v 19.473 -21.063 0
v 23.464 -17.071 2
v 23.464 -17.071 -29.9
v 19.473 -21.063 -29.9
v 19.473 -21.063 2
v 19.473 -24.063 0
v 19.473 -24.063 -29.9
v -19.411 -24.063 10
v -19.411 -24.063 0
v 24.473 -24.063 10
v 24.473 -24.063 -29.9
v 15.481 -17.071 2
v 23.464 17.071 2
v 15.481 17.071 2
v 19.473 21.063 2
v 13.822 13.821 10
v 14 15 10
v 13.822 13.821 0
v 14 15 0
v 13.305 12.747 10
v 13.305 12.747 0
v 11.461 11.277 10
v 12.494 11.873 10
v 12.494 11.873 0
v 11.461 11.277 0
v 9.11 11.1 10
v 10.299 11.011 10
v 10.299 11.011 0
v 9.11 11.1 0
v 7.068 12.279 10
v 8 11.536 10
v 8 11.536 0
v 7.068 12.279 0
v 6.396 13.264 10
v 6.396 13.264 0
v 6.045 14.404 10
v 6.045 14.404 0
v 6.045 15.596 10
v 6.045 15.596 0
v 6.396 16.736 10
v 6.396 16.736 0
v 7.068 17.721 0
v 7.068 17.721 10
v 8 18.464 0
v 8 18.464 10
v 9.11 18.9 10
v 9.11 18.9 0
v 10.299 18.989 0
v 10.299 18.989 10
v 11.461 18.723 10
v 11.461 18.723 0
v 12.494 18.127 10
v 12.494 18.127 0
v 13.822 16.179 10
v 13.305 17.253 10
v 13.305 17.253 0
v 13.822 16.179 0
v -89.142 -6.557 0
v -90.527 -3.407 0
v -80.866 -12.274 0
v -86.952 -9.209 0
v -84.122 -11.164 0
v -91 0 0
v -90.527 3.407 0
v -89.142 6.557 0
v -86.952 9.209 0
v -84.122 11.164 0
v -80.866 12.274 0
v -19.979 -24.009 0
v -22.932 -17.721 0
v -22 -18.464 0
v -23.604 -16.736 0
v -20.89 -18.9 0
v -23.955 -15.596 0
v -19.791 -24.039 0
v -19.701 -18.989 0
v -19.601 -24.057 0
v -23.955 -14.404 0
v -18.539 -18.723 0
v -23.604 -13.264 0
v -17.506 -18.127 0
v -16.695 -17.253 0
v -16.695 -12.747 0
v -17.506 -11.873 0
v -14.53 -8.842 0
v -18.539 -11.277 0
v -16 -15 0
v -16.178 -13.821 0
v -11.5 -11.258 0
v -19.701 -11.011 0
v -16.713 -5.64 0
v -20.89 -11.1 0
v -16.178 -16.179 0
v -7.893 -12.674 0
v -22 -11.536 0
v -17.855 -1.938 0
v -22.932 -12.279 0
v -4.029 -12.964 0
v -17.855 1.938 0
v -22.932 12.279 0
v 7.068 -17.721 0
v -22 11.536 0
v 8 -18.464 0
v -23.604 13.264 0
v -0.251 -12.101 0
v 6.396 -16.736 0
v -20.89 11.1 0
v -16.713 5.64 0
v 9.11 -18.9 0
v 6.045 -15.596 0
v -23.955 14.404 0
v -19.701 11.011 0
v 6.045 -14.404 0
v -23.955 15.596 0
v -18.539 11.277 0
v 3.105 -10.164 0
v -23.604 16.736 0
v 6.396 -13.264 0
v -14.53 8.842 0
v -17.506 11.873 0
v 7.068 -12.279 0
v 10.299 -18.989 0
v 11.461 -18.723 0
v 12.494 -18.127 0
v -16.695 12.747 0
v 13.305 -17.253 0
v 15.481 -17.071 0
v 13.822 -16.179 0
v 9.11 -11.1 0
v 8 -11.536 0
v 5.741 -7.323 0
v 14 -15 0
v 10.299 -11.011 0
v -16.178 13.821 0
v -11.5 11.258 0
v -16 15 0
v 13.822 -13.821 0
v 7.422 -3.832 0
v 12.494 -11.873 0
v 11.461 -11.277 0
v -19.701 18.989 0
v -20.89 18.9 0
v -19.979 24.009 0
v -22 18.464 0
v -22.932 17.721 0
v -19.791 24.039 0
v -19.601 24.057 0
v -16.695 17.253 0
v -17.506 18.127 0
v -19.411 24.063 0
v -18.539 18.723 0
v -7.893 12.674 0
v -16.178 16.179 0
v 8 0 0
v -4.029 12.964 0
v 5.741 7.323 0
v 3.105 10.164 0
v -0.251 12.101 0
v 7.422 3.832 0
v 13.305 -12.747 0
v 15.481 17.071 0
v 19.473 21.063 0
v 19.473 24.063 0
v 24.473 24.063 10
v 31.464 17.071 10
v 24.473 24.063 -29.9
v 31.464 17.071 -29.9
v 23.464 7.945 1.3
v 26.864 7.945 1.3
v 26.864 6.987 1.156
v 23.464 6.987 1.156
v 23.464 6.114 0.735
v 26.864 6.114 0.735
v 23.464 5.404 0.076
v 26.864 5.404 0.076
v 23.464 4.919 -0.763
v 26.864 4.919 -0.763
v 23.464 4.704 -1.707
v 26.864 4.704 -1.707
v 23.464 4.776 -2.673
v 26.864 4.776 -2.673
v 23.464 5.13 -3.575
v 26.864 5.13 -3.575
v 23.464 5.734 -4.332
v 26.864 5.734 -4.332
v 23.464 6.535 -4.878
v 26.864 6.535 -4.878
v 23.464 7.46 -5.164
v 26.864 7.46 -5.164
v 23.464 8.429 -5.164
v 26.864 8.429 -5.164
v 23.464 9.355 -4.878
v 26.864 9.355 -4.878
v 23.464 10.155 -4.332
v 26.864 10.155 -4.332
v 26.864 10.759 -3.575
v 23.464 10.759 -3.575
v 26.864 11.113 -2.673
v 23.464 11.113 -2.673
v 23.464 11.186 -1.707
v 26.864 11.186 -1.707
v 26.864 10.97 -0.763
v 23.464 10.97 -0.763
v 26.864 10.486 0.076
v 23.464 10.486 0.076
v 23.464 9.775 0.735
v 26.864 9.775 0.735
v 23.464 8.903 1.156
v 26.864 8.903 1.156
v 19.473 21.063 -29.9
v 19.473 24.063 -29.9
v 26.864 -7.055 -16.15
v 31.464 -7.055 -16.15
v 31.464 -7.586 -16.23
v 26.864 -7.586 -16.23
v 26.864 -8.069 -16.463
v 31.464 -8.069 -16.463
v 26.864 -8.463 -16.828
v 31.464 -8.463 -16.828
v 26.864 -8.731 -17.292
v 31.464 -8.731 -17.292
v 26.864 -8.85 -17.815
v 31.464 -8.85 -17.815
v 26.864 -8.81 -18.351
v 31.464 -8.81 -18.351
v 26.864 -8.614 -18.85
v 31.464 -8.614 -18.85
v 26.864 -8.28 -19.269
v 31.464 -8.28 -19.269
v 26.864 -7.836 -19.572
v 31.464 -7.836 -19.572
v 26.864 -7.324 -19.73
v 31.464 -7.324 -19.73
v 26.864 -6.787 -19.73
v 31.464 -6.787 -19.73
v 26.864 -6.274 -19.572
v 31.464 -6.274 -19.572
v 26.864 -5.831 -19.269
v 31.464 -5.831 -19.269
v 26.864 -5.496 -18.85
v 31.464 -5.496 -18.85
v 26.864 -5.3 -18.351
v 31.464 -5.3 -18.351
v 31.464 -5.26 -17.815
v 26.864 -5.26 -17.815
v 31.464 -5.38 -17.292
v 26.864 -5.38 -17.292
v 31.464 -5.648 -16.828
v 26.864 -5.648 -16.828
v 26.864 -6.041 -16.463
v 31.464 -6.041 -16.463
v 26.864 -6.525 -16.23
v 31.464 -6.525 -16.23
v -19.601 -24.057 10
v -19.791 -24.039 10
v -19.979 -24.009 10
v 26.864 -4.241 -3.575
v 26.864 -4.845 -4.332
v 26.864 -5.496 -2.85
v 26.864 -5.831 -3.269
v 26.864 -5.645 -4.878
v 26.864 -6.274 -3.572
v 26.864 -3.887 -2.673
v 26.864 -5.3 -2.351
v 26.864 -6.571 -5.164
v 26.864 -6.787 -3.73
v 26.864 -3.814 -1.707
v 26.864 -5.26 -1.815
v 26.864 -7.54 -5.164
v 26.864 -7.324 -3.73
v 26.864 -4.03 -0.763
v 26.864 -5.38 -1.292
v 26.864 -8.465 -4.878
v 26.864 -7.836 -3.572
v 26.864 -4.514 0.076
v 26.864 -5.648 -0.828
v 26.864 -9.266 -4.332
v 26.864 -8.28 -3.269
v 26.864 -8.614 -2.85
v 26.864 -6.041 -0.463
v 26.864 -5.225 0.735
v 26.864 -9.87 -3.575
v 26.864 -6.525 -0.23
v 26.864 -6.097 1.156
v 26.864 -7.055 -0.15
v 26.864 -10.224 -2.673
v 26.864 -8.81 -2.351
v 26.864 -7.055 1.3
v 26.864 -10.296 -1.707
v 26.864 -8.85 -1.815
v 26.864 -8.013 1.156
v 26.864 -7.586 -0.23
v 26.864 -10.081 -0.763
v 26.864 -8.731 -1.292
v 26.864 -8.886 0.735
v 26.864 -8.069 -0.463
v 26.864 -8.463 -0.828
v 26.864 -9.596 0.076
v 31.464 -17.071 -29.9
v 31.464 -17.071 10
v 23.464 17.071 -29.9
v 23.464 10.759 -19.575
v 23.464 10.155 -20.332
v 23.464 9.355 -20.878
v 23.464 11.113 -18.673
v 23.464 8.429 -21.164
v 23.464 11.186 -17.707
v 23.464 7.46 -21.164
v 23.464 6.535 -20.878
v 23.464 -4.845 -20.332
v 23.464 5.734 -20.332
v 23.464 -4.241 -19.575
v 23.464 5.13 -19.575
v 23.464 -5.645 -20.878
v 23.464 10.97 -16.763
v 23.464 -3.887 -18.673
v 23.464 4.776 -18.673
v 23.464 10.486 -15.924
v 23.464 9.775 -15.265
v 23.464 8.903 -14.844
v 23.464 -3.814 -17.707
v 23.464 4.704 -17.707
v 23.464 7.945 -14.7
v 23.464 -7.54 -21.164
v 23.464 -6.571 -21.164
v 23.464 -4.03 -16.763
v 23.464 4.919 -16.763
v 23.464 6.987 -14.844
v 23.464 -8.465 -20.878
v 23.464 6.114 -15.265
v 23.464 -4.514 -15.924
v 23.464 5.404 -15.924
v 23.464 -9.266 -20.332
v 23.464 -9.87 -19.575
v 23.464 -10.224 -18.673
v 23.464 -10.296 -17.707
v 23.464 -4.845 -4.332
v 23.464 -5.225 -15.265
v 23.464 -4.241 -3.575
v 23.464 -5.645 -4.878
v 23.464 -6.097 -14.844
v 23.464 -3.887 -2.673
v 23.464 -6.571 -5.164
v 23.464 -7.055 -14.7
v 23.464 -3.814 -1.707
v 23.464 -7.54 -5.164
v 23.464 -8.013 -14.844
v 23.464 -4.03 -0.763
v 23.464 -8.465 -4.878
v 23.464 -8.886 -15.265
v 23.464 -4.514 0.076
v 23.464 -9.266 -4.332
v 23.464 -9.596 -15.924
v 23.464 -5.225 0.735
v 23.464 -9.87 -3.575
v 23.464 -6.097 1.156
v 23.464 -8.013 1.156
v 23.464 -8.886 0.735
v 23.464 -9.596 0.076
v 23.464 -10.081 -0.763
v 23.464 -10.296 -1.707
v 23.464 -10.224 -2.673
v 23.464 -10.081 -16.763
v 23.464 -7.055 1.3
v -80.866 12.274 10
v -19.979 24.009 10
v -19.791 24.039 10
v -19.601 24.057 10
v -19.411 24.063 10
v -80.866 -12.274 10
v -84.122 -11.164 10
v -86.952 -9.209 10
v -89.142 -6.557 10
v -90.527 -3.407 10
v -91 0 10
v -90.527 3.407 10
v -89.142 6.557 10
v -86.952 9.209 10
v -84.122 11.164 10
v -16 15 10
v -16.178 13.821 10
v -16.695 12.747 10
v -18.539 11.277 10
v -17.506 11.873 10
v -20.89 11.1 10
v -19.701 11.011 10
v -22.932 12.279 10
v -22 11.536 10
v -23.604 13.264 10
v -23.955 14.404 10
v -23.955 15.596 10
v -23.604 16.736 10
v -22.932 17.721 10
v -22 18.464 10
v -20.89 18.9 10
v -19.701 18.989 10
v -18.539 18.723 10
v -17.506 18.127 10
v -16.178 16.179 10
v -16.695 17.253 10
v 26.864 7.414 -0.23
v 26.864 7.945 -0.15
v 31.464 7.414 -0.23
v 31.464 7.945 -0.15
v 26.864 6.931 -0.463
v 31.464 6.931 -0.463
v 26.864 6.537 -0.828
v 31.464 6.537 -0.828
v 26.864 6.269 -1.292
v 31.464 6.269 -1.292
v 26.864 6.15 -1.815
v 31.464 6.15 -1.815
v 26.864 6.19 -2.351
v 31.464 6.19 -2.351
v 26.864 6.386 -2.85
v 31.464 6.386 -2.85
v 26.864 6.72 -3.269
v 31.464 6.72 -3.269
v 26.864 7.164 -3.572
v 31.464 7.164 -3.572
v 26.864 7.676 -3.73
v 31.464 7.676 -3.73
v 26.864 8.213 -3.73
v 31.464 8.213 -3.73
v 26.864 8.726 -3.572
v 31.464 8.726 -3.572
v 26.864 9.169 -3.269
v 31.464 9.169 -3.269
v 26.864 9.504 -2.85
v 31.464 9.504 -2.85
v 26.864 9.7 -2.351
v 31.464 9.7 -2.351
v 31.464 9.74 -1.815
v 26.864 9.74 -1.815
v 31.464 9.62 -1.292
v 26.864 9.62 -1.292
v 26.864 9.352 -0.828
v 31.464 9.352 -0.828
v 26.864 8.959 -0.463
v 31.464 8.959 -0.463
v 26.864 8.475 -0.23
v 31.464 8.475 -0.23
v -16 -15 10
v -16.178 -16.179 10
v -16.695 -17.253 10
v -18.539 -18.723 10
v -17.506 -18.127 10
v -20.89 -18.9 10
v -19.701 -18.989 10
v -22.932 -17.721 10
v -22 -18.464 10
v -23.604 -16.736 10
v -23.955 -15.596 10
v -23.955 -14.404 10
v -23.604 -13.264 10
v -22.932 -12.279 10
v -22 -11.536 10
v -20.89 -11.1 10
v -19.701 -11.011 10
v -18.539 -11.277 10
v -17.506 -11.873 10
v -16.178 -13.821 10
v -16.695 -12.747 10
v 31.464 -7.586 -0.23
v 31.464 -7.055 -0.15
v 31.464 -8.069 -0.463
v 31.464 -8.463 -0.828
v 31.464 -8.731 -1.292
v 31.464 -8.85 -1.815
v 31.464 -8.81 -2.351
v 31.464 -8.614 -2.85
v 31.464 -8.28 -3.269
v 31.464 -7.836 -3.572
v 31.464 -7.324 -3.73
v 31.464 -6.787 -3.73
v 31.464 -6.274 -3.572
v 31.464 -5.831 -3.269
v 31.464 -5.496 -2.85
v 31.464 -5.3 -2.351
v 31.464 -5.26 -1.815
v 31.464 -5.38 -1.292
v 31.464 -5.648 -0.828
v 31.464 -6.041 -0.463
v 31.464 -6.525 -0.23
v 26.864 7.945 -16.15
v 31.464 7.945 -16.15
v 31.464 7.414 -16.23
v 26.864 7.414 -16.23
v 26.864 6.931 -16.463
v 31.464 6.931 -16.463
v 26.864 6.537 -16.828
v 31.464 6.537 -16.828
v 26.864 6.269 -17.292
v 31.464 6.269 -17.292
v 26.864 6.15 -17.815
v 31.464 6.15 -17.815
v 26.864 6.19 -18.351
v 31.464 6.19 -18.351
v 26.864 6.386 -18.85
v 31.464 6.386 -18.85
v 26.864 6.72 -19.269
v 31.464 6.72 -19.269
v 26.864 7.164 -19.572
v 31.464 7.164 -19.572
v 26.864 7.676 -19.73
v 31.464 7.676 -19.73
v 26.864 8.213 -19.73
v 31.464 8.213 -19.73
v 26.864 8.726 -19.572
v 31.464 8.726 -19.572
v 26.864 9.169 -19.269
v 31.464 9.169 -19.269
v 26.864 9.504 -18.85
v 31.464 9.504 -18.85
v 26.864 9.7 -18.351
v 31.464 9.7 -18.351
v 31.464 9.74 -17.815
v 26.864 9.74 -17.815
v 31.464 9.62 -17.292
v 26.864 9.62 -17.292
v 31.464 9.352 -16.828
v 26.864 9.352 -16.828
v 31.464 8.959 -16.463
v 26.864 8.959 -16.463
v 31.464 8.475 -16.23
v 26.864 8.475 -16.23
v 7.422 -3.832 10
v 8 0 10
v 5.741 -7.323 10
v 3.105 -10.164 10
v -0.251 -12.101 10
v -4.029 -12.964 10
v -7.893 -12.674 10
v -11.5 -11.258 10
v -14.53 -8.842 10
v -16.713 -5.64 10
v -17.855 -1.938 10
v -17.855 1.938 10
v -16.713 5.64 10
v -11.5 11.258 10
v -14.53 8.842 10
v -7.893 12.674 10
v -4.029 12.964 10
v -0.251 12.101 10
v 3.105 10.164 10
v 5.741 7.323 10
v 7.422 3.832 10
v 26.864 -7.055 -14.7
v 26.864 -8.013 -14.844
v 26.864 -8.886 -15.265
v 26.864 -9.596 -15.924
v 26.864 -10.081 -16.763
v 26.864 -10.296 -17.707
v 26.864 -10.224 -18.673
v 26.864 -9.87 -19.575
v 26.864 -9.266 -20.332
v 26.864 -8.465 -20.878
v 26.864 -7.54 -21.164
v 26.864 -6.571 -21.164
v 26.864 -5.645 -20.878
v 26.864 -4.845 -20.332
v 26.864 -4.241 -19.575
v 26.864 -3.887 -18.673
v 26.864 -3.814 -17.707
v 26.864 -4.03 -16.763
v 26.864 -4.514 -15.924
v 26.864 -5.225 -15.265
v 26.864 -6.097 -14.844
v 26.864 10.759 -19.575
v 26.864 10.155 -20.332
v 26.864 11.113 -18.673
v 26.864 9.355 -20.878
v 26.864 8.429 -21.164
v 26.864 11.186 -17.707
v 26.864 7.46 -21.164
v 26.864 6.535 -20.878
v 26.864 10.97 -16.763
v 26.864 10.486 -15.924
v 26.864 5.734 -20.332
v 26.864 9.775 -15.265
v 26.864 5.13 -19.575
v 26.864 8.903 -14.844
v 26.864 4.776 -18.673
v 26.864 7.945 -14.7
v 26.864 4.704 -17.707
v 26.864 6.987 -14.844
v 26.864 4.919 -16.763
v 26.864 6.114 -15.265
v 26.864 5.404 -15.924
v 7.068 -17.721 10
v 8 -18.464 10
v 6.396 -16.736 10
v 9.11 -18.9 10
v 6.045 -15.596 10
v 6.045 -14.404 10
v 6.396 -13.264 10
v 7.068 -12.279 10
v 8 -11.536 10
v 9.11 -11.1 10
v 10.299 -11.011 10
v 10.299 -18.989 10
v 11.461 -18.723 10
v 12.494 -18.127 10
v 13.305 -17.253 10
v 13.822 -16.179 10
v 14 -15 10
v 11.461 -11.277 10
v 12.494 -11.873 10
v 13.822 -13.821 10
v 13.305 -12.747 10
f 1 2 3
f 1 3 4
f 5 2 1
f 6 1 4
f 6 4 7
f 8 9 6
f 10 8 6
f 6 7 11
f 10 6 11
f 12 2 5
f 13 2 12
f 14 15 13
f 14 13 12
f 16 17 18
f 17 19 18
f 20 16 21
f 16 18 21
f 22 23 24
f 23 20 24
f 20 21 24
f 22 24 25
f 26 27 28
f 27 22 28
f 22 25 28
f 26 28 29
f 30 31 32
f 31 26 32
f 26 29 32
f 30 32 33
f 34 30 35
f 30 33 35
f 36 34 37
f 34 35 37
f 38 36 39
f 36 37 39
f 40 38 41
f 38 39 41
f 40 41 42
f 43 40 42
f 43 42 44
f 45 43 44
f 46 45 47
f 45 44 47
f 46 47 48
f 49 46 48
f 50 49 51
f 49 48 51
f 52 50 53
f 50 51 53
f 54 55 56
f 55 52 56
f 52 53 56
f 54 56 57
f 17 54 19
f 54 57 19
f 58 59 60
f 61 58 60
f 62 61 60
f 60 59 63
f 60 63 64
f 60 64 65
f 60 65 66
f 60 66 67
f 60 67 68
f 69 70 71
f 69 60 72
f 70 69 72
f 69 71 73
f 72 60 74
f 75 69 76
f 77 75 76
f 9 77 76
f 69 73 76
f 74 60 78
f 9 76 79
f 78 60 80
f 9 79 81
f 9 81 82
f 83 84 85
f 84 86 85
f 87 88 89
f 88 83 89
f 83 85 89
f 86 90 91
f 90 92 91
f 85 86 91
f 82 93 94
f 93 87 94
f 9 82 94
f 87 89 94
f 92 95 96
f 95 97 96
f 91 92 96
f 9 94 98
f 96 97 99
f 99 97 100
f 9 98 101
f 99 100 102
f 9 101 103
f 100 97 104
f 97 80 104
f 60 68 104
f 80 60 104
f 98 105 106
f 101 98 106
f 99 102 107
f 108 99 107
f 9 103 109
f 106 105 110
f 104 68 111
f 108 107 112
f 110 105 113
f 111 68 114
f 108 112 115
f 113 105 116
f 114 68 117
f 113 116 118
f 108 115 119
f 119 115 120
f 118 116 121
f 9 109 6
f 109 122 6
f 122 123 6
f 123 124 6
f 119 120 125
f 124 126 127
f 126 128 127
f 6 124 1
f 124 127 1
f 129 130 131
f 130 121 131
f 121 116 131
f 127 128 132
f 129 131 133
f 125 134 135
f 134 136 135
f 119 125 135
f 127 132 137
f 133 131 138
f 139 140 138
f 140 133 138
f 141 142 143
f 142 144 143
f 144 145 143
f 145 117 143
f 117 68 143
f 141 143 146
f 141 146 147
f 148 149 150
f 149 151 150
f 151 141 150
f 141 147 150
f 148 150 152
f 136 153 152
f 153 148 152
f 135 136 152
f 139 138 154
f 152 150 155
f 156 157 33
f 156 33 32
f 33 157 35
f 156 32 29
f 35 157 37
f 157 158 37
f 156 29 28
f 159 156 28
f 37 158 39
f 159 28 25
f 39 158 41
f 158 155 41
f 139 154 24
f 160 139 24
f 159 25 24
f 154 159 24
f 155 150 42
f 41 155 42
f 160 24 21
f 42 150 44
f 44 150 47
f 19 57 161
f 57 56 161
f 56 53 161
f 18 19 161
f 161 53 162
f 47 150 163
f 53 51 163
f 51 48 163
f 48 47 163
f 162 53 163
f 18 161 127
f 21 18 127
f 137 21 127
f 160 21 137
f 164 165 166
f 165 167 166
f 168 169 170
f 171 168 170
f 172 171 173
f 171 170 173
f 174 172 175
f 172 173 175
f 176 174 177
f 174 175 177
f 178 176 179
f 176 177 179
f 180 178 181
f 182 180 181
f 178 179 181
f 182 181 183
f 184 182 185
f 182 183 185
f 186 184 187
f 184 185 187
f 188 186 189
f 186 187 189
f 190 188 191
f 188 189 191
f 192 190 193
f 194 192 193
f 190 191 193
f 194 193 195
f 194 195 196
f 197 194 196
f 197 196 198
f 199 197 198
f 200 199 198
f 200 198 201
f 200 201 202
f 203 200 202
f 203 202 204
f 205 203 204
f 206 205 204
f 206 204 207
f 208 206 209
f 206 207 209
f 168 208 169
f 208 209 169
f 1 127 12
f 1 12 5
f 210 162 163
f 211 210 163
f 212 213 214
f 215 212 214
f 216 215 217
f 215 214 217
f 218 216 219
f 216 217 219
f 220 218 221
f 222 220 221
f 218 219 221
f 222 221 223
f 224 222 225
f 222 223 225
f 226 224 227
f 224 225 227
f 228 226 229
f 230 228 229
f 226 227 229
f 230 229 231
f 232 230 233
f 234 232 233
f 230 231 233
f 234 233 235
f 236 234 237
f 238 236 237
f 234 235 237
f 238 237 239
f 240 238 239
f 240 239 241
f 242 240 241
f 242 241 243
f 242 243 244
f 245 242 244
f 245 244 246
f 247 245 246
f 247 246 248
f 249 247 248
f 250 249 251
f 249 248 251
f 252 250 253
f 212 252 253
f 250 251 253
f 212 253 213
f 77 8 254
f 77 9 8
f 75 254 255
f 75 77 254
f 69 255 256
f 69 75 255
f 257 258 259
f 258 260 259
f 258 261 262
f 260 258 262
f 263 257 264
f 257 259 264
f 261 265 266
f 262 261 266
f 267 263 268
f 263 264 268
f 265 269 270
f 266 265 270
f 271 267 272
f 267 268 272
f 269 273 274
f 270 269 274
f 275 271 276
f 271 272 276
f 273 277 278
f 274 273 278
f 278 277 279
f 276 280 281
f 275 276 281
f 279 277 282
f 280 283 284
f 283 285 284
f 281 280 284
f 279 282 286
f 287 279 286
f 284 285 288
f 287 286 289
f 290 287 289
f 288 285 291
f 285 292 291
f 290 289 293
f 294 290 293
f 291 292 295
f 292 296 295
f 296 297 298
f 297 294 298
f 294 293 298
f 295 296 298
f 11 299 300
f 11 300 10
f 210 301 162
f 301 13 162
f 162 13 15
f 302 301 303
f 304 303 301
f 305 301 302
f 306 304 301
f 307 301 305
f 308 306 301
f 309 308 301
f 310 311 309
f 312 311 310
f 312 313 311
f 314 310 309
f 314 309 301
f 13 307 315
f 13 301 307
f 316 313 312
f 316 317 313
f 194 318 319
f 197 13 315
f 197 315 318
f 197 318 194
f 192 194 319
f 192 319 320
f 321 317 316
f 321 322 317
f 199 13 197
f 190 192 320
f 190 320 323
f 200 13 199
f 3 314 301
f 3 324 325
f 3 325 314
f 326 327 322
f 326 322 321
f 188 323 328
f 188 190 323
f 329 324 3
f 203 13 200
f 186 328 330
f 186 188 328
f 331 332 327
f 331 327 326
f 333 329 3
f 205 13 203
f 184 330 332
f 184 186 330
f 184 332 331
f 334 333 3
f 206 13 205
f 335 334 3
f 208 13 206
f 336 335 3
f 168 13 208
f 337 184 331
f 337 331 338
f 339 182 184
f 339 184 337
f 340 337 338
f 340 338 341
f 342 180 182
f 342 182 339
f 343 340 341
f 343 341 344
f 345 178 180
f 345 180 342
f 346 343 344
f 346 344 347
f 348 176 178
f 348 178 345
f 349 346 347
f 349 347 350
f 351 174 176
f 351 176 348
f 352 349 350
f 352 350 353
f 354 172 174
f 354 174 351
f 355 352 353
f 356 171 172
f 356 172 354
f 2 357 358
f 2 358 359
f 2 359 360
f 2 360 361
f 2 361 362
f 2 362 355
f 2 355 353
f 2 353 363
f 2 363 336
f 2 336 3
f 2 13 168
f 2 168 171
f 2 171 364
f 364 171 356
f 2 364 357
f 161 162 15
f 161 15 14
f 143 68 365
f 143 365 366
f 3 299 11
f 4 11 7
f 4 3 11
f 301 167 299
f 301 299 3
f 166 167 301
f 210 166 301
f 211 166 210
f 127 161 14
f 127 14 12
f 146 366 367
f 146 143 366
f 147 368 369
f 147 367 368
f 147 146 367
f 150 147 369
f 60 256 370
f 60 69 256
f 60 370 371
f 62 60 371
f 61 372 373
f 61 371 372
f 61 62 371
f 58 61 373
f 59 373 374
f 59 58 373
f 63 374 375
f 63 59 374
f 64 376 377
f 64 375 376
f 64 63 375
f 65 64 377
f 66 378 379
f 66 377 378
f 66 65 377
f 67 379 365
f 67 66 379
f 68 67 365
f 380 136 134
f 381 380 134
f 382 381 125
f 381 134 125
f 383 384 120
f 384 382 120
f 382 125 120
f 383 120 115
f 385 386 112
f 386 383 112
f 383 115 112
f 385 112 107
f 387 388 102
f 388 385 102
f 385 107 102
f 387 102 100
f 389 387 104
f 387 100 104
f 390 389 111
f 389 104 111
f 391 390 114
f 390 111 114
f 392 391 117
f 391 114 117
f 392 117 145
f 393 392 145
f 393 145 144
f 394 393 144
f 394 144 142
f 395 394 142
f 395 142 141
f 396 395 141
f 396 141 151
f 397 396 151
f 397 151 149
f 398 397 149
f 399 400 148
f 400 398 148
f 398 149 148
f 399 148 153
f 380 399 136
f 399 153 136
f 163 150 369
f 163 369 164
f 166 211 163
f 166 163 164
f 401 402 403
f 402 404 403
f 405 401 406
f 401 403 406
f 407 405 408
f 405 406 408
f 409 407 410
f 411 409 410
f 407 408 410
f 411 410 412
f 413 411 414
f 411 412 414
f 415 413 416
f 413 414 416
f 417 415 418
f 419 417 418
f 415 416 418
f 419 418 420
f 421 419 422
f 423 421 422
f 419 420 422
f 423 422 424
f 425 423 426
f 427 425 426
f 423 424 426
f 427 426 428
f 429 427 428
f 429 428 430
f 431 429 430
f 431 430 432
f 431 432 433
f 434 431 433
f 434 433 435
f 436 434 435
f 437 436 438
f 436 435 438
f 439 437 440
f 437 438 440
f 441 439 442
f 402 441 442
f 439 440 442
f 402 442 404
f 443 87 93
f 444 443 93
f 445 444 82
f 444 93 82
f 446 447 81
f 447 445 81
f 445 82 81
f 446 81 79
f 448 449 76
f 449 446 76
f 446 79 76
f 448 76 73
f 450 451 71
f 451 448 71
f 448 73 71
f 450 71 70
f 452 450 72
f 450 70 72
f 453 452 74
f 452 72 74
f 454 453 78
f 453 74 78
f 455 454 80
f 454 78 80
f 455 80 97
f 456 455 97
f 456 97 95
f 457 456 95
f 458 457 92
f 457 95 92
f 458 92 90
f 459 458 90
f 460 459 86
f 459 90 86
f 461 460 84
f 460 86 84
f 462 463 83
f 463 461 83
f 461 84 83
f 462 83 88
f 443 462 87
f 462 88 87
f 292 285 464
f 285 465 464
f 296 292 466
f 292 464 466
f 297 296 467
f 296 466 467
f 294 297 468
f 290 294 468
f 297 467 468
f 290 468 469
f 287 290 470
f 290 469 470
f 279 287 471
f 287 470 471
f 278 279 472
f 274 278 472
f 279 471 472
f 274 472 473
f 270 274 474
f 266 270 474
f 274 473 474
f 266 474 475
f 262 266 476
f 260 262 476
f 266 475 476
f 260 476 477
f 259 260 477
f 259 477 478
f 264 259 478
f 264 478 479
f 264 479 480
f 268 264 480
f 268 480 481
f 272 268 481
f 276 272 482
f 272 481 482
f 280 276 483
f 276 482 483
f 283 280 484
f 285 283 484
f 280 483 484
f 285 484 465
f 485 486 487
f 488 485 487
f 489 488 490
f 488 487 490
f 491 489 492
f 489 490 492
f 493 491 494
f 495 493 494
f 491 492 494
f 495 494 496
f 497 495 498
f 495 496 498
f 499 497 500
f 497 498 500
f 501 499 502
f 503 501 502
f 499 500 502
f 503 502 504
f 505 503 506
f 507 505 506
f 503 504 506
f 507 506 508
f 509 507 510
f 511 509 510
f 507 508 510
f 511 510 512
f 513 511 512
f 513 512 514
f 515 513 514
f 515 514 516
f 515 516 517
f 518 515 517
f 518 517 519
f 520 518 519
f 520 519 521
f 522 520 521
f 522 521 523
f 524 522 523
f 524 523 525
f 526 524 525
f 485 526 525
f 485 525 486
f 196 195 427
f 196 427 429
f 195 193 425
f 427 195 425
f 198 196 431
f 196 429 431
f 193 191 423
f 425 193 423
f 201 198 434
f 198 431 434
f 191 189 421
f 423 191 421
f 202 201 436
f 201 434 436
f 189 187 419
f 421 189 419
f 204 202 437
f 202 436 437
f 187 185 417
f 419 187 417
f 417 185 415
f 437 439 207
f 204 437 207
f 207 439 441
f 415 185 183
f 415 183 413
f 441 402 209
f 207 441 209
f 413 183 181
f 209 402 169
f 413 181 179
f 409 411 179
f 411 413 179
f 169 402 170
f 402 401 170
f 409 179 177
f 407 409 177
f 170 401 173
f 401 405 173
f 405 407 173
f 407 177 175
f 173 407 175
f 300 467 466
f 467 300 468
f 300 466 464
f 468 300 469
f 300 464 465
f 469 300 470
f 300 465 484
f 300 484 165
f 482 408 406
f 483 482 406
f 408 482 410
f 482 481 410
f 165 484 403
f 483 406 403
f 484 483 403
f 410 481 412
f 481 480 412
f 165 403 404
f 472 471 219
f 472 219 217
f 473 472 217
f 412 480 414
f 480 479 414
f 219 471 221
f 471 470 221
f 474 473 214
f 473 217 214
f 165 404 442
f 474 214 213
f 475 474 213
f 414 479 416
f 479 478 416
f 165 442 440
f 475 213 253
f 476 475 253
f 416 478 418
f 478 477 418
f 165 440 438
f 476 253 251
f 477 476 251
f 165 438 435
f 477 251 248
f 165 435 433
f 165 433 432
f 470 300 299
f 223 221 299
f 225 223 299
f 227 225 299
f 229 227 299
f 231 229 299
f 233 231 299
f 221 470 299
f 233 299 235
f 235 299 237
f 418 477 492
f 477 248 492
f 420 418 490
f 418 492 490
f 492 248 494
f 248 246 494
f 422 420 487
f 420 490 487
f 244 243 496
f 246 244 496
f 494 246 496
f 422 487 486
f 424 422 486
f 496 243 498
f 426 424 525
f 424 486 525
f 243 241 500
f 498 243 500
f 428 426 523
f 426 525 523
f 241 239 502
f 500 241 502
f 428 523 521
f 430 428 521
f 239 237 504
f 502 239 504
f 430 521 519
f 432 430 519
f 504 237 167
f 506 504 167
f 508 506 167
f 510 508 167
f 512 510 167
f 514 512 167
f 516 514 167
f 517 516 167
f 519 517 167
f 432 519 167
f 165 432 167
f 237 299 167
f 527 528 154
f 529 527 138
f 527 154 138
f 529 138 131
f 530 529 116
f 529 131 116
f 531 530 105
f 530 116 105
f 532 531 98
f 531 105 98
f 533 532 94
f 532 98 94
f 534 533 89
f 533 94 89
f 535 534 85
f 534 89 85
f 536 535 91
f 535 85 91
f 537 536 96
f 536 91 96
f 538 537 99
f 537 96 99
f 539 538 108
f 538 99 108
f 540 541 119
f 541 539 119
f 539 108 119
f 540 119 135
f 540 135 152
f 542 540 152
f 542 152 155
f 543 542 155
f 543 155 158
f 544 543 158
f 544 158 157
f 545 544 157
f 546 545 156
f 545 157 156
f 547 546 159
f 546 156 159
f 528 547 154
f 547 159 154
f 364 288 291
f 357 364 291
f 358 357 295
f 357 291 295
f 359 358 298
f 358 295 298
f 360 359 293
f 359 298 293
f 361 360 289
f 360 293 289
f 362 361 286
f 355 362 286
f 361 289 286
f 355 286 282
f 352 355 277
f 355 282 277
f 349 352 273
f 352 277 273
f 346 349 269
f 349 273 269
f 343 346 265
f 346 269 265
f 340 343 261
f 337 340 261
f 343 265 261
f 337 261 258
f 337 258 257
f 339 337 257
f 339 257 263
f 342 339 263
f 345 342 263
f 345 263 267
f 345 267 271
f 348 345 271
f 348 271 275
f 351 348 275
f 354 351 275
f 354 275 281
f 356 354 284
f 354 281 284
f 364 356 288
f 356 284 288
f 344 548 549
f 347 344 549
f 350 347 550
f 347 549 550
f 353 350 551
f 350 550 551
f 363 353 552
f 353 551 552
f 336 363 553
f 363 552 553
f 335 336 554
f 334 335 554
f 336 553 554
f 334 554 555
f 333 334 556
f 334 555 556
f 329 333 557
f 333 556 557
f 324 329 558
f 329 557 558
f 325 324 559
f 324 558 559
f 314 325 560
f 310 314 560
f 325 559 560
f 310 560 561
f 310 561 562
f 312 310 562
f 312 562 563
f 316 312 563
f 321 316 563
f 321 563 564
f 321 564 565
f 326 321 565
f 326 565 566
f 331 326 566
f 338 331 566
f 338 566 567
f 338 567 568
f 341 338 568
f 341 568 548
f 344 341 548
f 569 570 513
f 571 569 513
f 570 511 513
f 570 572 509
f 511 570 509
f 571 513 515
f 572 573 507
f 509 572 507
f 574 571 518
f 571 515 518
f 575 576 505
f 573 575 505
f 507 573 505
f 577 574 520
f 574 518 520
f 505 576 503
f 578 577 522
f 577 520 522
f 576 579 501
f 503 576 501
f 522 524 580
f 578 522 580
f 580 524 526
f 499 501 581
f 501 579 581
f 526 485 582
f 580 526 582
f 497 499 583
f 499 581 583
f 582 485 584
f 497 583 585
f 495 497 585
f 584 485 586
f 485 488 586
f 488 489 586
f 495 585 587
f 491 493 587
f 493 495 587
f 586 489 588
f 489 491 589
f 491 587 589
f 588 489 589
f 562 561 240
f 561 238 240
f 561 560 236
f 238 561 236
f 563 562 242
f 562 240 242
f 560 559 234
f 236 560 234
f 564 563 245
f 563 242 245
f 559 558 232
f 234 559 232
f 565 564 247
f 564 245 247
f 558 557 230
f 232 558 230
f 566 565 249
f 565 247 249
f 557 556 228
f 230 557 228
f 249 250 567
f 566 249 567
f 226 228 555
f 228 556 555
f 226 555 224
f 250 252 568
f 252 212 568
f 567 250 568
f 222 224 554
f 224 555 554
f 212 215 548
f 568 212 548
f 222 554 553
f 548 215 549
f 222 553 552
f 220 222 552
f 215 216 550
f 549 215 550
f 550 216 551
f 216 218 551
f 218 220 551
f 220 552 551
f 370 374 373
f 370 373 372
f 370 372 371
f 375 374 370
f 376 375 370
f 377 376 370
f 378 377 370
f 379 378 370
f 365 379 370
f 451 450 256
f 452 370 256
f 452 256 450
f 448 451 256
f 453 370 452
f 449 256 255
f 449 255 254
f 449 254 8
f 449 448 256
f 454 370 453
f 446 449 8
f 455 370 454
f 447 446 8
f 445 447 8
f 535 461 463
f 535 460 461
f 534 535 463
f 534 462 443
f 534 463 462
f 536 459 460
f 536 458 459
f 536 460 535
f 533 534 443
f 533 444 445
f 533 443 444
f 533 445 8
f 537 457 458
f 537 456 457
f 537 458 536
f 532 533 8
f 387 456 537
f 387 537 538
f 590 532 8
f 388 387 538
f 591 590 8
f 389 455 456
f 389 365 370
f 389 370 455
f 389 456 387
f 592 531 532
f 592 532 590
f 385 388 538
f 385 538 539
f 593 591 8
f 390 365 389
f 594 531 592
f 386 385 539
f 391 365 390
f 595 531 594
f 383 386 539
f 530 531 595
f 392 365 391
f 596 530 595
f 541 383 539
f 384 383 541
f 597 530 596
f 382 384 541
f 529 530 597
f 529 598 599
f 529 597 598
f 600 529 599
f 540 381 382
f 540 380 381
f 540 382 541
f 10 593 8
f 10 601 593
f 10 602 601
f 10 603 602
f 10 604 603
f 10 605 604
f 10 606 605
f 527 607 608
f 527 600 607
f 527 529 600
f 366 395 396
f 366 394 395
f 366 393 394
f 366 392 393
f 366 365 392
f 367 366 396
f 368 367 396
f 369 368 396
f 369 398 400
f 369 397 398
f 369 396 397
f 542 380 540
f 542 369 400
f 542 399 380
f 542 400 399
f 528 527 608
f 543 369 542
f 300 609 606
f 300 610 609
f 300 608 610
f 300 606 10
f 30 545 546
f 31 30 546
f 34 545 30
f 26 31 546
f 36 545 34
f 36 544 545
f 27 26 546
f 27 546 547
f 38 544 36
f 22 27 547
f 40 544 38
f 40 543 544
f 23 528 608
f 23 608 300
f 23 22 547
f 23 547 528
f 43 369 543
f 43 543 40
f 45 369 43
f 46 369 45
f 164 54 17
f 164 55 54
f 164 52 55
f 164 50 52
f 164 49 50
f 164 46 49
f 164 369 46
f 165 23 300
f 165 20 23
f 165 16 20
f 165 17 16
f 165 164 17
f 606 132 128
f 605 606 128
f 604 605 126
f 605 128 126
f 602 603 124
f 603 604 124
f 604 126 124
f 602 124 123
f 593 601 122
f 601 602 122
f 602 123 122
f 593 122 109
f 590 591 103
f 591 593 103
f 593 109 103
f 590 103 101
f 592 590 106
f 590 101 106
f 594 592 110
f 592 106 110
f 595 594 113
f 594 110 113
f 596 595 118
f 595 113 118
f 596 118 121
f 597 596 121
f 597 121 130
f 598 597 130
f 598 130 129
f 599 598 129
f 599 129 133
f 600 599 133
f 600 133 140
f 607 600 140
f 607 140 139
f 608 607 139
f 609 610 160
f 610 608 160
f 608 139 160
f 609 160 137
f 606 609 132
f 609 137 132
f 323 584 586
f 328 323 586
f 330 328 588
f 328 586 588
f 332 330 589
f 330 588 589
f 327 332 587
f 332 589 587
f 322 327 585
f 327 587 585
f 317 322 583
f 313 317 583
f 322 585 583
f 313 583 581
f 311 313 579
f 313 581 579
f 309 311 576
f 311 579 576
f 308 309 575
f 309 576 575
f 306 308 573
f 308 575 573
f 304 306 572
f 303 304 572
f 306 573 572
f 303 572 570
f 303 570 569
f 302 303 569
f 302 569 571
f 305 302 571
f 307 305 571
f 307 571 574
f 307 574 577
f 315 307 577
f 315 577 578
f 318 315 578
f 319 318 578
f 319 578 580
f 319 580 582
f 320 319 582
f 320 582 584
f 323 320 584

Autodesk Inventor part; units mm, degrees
ref_plane "YZ Plane" through (0, 0, 0) normal (1, 0, 0) x (0, 1, 0)
ref_plane "XZ Plane" through (0, 0, 0) normal (0, 1, 0) x (-1, 0, 0)
ref_plane "XY Plane" through (0, 0, 0) normal (0, 0, 1) x (1, 0, 0)
sketch "Sketch1" plane through (0, 0, 0) normal (0, 0, 1) x (1, 0, 0)
  arc A0 (18.1843, -16.5324) -> (18.7618, -13.101) centre (16.0629, -14.4111) ccw projected
  arc A1 (18.7618, 13.101) -> (18.7618, -13.101) centre (45.75, 0) ccw projected
  arc A2 (18.7618, 13.101) -> (18.1843, 16.5324) centre (16.0629, 14.4111) ccw projected
  line L0 (11.5324, 23.1843) -> (18.1843, 16.5324) projected
  arc A3 (11.5324, 23.1843) -> (8.101, 23.7618) centre (9.4111, 21.0629) ccw projected
  arc A4 (-18.101, 23.7618) -> (8.101, 23.7618) centre (-5, 50.75) ccw projected
  arc A5 (-18.101, 23.7618) -> (-21.5324, 23.1843) centre (-19.4111, 21.0629) ccw projected
  line L1 (-28.1843, 16.5324) -> (-21.5324, 23.1843) projected
  arc A6 (-28.1843, 16.5324) -> (-28.7618, 13.101) centre (-26.0629, 14.4111) ccw projected
  arc A7 (-28.7618, -13.101) -> (-28.7618, 13.101) centre (-55.75, 0) ccw projected
  arc A8 (-28.7618, -13.101) -> (-28.1843, -16.5324) centre (-26.0629, -14.4111) ccw projected
  line L2 (-21.5324, -23.1843) -> (-28.1843, -16.5324) projected
  arc A9 (-21.5324, -23.1843) -> (-18.101, -23.7618) centre (-19.4111, -21.0629) ccw projected
  arc A10 (8.101, -23.7618) -> (-18.101, -23.7618) centre (-5, -50.75) ccw projected
  arc A11 (8.101, -23.7618) -> (11.5324, -23.1843) centre (9.4111, -21.0629) ccw projected
  line L3 (18.1843, -16.5324) -> (11.5324, -23.1843) projected
  circle A12 centre (10, -15) radius 4 projected
  circle A13 centre (-20, -15) radius 4 projected
  circle A14 centre (-20, 15) radius 4 projected
  circle A15 centre (10, 15) radius 4 projected
  circle A16 centre (-5, 0) radius 13 projected
  line L4 (39.4645, -4.5) -> (34.9645, -4.5) projected
  line L5 (34.9645, -4.5) -> (34.9645, 4.5) projected
  line L6 (34.9645, 4.5) -> (39.4645, 4.5) projected
  line L7 (39.4645, 4.5) -> (39.4645, 10) projected
  line L8 (39.4645, 10) -> (31.4645, 10) projected
  line L9 (31.4645, 10) -> (31.4645, -10) projected
  line L10 (31.4645, -10) -> (39.4645, -10) projected
  line L11 (39.4645, -10) -> (39.4645, -4.5) projected
  line L12 (31.4645, -10) -> (31.4645, -17.0711)
  line L13 (31.4645, -17.0711) -> (24.4726, -24.0629)
  line L14 (31.4645, 10) -> (31.4645, 17.0711)
  line L15 (-19.4111, -24.0629) -> (24.4726, -24.0629)
  line L16 (-19.4111, 24.0629) -> (24.4726, 24.0629)
  line L17 (31.4645, 17.0711) -> (24.4726, 24.0629)
  circle A17 centre (-78.5, 0) radius 12.5
  line L18 (-19.9788, -24.0087) -> (-80.8656, -12.2741)
  line L19 (-80.8656, 12.2741) -> (-19.9788, 24.0087)
  point P0 (0, 0)
  dimension "d0" = 45
  dimension "d1" = 5
  dimension "d4" = 78.5
  dimension "d5" = 25
extrude "Extrusion1" add sketch "Sketch1" along normal blind 10 contours L3 A11 A10 A9 L2 A8 A7 A6 L1 A5 A4 A3 L0 A2 A1 A0 | A0 A1 A2 L0 A3 L16 L17 L14 L9 L12 L13 L15 A11 L3 | L15 A9 A10 A11 | L18 A17 L19 A5 L1 A6 A7 A8 L2 A9 | A3 A4 A5 L16 | A17
sketch "Sketch2" plane through (0, 0, 0) normal (0, 0, -1) x (-1, 0, 0)
  line L0 (-24.4726, -24.0629) -> (-31.4645, -17.0711) projected
  line L1 (19.4111, -24.0629) -> (-24.4726, -24.0629) projected
  arc A0 (19.4111, -24.0629) -> (19.9788, -24.0087) centre (19.4111, -21.0629) ccw projected
  line L2 (80.8656, -12.2741) -> (19.9788, -24.0087) projected
  arc A1 (80.8656, -12.2741) -> (80.8656, 12.2741) centre (78.5, 0) ccw projected
  line L3 (19.9788, 24.0087) -> (80.8656, 12.2741) projected
  arc A2 (19.9788, 24.0087) -> (19.4111, 24.0629) centre (19.4111, 21.0629) ccw projected
  line L4 (-24.4726, 24.0629) -> (19.4111, 24.0629) projected
  line L5 (-31.4645, 17.0711) -> (-24.4726, 24.0629) projected
  line L6 (-31.4645, -17.0711) -> (-31.4645, 17.0711) projected
  circle A3 centre (-10, -15) radius 4 projected
  circle A4 centre (20, -15) radius 4 projected
  circle A5 centre (20, 15) radius 4 projected
  circle A6 centre (-10, 15) radius 4 projected
  circle A7 centre (5, 0) radius 13 projected
  line L7 (-31.4645, 17.0711) -> (-23.4645, 17.0711)
  line L8 (-23.4645, 17.0711) -> (-23.4645, -17.0711)
  line L9 (-24.4726, -24.0629) -> (-31.4645, -17.0711) projected
  line L10 (-23.4645, -17.0711) -> (-31.4645, -17.0711)
  line L11 (-23.4645, 17.0711) -> (-19.4726, 21.0629)
  line L12 (-19.4726, 21.0629) -> (-19.4726, 24.0629)
  line L13 (-23.4645, -17.0711) -> (-19.4726, -21.0629)
  line L14 (-19.4726, -21.0629) -> (-19.4726, -24.0629)
  line L15 (19.4111, -24.0629) -> (-24.4726, -24.0629) projected
  point P0 (0, 0)
  dimension "d6" = 8
  dimension "d9" = 3
extrude "Extrusion2" add sketch "Sketch2" along normal blind 29.9 contours L0 L10 L13 L14 L1 | L6 L7 L8 L10 | L5 L4 L12 L11 L7
sketch "Sketch3" plane through (23.4645, -17.0711, 0) normal (-1, 0, 0) x (0, 0, 1)
  line L0 (0, 34.1421) -> (0, 0) projected
  line L1 (0, 34.1421) -> (-29.9, 34.1421) projected
  line L2 (-29.9, 0) -> (-29.9, 34.1421) projected
  line L3 (0, 0) -> (-29.9, 0) projected
  point P0 (0, 17.0711)
  point P1 (-1.95, 25.0158)
  point P2 (-17.95, 25.0158)
  point P3 (-17.95, 10.0158)
  point P4 (-1.95, 10.0158)
  dimension "d10" = 15
  dimension "d11" = 16
  dimension "d12" = 11.95
hole "Hole1" at (23.4645, 7.9447, -1.95) at (23.4645, 7.9447, -17.95) at (23.4645, -7.0553, -17.95) at (23.4645, -7.0553, -1.95) direction (1, 0, 0) diameter 3.6 end through all counterbore diameter 6.5 counterbore depth 3.4 clearance for "Socket Head Cap Screw DIN EN ISO 4762" size "M3" standard "DIN"
sketch "Sketch4" plane through (0, 0, 0) normal (0, 0, -1) x (-1, 0, 0)
  circle A0 centre (5, 0) radius 13 projected
  circle A1 centre (-10, 15) radius 4 projected
  circle A2 centre (20, 15) radius 4 projected
  circle A3 centre (20, -15) radius 4 projected
  circle A4 centre (-10, -15) radius 4 projected
  line L0 (-19.4726, 24.0629) -> (-19.4726, 21.0629) projected
  line L1 (-19.4726, 21.0629) -> (-23.4645, 17.0711) projected
  line L2 (-23.4645, 17.0711) -> (-23.4645, 10.5447) projected
  line L3 (-23.4645, 10.5447) -> (-23.4645, 5.3447) projected
  line L4 (-23.4645, 5.3447) -> (-23.4645, -4.4553) projected
  line L5 (-23.4645, -4.4553) -> (-23.4645, -9.6553) projected
  line L6 (-23.4645, -9.6553) -> (-23.4645, -17.0711) projected
  line L7 (-23.4645, -17.0711) -> (-19.4726, -21.0629) projected
  line L8 (-19.4726, -21.0629) -> (-19.4726, -24.0629) projected
  line L9 (19.4111, -24.0629) -> (-19.4726, -24.0629) projected
  arc A5 (19.4111, -24.0629) -> (19.9788, -24.0087) centre (19.4111, -21.0629) ccw projected
  line L10 (80.8656, -12.2741) -> (19.9788, -24.0087) projected
  arc A6 (80.8656, -12.2741) -> (80.8656, 12.2741) centre (78.5, 0) ccw projected
  line L11 (19.9788, 24.0087) -> (80.8656, 12.2741) projected
  arc A7 (19.9788, 24.0087) -> (19.4111, 24.0629) centre (19.4111, 21.0629) ccw projected
  line L12 (-19.4726, 24.0629) -> (19.4111, 24.0629) projected
  line L13 (-19.4726, 21.0629) -> (-15.4807, 17.0711)
  line L14 (-15.4807, 17.0711) -> (-15.4807, -17.0711)
  line L15 (-15.4807, -17.0711) -> (-19.4726, -21.0629)
  line L16 (-23.4645, 17.0711) -> (-19.4726, 21.0629) projected
  point P0 (0, 0)
extrude "Extrusion3" cut sketch "Sketch4" against normal blind 2 contours L13 L14 L15 L7 L6 L5 L4 L3 L2 L1
properties part number "Corner Z Axis Carriage" material "ABS Plastic"
